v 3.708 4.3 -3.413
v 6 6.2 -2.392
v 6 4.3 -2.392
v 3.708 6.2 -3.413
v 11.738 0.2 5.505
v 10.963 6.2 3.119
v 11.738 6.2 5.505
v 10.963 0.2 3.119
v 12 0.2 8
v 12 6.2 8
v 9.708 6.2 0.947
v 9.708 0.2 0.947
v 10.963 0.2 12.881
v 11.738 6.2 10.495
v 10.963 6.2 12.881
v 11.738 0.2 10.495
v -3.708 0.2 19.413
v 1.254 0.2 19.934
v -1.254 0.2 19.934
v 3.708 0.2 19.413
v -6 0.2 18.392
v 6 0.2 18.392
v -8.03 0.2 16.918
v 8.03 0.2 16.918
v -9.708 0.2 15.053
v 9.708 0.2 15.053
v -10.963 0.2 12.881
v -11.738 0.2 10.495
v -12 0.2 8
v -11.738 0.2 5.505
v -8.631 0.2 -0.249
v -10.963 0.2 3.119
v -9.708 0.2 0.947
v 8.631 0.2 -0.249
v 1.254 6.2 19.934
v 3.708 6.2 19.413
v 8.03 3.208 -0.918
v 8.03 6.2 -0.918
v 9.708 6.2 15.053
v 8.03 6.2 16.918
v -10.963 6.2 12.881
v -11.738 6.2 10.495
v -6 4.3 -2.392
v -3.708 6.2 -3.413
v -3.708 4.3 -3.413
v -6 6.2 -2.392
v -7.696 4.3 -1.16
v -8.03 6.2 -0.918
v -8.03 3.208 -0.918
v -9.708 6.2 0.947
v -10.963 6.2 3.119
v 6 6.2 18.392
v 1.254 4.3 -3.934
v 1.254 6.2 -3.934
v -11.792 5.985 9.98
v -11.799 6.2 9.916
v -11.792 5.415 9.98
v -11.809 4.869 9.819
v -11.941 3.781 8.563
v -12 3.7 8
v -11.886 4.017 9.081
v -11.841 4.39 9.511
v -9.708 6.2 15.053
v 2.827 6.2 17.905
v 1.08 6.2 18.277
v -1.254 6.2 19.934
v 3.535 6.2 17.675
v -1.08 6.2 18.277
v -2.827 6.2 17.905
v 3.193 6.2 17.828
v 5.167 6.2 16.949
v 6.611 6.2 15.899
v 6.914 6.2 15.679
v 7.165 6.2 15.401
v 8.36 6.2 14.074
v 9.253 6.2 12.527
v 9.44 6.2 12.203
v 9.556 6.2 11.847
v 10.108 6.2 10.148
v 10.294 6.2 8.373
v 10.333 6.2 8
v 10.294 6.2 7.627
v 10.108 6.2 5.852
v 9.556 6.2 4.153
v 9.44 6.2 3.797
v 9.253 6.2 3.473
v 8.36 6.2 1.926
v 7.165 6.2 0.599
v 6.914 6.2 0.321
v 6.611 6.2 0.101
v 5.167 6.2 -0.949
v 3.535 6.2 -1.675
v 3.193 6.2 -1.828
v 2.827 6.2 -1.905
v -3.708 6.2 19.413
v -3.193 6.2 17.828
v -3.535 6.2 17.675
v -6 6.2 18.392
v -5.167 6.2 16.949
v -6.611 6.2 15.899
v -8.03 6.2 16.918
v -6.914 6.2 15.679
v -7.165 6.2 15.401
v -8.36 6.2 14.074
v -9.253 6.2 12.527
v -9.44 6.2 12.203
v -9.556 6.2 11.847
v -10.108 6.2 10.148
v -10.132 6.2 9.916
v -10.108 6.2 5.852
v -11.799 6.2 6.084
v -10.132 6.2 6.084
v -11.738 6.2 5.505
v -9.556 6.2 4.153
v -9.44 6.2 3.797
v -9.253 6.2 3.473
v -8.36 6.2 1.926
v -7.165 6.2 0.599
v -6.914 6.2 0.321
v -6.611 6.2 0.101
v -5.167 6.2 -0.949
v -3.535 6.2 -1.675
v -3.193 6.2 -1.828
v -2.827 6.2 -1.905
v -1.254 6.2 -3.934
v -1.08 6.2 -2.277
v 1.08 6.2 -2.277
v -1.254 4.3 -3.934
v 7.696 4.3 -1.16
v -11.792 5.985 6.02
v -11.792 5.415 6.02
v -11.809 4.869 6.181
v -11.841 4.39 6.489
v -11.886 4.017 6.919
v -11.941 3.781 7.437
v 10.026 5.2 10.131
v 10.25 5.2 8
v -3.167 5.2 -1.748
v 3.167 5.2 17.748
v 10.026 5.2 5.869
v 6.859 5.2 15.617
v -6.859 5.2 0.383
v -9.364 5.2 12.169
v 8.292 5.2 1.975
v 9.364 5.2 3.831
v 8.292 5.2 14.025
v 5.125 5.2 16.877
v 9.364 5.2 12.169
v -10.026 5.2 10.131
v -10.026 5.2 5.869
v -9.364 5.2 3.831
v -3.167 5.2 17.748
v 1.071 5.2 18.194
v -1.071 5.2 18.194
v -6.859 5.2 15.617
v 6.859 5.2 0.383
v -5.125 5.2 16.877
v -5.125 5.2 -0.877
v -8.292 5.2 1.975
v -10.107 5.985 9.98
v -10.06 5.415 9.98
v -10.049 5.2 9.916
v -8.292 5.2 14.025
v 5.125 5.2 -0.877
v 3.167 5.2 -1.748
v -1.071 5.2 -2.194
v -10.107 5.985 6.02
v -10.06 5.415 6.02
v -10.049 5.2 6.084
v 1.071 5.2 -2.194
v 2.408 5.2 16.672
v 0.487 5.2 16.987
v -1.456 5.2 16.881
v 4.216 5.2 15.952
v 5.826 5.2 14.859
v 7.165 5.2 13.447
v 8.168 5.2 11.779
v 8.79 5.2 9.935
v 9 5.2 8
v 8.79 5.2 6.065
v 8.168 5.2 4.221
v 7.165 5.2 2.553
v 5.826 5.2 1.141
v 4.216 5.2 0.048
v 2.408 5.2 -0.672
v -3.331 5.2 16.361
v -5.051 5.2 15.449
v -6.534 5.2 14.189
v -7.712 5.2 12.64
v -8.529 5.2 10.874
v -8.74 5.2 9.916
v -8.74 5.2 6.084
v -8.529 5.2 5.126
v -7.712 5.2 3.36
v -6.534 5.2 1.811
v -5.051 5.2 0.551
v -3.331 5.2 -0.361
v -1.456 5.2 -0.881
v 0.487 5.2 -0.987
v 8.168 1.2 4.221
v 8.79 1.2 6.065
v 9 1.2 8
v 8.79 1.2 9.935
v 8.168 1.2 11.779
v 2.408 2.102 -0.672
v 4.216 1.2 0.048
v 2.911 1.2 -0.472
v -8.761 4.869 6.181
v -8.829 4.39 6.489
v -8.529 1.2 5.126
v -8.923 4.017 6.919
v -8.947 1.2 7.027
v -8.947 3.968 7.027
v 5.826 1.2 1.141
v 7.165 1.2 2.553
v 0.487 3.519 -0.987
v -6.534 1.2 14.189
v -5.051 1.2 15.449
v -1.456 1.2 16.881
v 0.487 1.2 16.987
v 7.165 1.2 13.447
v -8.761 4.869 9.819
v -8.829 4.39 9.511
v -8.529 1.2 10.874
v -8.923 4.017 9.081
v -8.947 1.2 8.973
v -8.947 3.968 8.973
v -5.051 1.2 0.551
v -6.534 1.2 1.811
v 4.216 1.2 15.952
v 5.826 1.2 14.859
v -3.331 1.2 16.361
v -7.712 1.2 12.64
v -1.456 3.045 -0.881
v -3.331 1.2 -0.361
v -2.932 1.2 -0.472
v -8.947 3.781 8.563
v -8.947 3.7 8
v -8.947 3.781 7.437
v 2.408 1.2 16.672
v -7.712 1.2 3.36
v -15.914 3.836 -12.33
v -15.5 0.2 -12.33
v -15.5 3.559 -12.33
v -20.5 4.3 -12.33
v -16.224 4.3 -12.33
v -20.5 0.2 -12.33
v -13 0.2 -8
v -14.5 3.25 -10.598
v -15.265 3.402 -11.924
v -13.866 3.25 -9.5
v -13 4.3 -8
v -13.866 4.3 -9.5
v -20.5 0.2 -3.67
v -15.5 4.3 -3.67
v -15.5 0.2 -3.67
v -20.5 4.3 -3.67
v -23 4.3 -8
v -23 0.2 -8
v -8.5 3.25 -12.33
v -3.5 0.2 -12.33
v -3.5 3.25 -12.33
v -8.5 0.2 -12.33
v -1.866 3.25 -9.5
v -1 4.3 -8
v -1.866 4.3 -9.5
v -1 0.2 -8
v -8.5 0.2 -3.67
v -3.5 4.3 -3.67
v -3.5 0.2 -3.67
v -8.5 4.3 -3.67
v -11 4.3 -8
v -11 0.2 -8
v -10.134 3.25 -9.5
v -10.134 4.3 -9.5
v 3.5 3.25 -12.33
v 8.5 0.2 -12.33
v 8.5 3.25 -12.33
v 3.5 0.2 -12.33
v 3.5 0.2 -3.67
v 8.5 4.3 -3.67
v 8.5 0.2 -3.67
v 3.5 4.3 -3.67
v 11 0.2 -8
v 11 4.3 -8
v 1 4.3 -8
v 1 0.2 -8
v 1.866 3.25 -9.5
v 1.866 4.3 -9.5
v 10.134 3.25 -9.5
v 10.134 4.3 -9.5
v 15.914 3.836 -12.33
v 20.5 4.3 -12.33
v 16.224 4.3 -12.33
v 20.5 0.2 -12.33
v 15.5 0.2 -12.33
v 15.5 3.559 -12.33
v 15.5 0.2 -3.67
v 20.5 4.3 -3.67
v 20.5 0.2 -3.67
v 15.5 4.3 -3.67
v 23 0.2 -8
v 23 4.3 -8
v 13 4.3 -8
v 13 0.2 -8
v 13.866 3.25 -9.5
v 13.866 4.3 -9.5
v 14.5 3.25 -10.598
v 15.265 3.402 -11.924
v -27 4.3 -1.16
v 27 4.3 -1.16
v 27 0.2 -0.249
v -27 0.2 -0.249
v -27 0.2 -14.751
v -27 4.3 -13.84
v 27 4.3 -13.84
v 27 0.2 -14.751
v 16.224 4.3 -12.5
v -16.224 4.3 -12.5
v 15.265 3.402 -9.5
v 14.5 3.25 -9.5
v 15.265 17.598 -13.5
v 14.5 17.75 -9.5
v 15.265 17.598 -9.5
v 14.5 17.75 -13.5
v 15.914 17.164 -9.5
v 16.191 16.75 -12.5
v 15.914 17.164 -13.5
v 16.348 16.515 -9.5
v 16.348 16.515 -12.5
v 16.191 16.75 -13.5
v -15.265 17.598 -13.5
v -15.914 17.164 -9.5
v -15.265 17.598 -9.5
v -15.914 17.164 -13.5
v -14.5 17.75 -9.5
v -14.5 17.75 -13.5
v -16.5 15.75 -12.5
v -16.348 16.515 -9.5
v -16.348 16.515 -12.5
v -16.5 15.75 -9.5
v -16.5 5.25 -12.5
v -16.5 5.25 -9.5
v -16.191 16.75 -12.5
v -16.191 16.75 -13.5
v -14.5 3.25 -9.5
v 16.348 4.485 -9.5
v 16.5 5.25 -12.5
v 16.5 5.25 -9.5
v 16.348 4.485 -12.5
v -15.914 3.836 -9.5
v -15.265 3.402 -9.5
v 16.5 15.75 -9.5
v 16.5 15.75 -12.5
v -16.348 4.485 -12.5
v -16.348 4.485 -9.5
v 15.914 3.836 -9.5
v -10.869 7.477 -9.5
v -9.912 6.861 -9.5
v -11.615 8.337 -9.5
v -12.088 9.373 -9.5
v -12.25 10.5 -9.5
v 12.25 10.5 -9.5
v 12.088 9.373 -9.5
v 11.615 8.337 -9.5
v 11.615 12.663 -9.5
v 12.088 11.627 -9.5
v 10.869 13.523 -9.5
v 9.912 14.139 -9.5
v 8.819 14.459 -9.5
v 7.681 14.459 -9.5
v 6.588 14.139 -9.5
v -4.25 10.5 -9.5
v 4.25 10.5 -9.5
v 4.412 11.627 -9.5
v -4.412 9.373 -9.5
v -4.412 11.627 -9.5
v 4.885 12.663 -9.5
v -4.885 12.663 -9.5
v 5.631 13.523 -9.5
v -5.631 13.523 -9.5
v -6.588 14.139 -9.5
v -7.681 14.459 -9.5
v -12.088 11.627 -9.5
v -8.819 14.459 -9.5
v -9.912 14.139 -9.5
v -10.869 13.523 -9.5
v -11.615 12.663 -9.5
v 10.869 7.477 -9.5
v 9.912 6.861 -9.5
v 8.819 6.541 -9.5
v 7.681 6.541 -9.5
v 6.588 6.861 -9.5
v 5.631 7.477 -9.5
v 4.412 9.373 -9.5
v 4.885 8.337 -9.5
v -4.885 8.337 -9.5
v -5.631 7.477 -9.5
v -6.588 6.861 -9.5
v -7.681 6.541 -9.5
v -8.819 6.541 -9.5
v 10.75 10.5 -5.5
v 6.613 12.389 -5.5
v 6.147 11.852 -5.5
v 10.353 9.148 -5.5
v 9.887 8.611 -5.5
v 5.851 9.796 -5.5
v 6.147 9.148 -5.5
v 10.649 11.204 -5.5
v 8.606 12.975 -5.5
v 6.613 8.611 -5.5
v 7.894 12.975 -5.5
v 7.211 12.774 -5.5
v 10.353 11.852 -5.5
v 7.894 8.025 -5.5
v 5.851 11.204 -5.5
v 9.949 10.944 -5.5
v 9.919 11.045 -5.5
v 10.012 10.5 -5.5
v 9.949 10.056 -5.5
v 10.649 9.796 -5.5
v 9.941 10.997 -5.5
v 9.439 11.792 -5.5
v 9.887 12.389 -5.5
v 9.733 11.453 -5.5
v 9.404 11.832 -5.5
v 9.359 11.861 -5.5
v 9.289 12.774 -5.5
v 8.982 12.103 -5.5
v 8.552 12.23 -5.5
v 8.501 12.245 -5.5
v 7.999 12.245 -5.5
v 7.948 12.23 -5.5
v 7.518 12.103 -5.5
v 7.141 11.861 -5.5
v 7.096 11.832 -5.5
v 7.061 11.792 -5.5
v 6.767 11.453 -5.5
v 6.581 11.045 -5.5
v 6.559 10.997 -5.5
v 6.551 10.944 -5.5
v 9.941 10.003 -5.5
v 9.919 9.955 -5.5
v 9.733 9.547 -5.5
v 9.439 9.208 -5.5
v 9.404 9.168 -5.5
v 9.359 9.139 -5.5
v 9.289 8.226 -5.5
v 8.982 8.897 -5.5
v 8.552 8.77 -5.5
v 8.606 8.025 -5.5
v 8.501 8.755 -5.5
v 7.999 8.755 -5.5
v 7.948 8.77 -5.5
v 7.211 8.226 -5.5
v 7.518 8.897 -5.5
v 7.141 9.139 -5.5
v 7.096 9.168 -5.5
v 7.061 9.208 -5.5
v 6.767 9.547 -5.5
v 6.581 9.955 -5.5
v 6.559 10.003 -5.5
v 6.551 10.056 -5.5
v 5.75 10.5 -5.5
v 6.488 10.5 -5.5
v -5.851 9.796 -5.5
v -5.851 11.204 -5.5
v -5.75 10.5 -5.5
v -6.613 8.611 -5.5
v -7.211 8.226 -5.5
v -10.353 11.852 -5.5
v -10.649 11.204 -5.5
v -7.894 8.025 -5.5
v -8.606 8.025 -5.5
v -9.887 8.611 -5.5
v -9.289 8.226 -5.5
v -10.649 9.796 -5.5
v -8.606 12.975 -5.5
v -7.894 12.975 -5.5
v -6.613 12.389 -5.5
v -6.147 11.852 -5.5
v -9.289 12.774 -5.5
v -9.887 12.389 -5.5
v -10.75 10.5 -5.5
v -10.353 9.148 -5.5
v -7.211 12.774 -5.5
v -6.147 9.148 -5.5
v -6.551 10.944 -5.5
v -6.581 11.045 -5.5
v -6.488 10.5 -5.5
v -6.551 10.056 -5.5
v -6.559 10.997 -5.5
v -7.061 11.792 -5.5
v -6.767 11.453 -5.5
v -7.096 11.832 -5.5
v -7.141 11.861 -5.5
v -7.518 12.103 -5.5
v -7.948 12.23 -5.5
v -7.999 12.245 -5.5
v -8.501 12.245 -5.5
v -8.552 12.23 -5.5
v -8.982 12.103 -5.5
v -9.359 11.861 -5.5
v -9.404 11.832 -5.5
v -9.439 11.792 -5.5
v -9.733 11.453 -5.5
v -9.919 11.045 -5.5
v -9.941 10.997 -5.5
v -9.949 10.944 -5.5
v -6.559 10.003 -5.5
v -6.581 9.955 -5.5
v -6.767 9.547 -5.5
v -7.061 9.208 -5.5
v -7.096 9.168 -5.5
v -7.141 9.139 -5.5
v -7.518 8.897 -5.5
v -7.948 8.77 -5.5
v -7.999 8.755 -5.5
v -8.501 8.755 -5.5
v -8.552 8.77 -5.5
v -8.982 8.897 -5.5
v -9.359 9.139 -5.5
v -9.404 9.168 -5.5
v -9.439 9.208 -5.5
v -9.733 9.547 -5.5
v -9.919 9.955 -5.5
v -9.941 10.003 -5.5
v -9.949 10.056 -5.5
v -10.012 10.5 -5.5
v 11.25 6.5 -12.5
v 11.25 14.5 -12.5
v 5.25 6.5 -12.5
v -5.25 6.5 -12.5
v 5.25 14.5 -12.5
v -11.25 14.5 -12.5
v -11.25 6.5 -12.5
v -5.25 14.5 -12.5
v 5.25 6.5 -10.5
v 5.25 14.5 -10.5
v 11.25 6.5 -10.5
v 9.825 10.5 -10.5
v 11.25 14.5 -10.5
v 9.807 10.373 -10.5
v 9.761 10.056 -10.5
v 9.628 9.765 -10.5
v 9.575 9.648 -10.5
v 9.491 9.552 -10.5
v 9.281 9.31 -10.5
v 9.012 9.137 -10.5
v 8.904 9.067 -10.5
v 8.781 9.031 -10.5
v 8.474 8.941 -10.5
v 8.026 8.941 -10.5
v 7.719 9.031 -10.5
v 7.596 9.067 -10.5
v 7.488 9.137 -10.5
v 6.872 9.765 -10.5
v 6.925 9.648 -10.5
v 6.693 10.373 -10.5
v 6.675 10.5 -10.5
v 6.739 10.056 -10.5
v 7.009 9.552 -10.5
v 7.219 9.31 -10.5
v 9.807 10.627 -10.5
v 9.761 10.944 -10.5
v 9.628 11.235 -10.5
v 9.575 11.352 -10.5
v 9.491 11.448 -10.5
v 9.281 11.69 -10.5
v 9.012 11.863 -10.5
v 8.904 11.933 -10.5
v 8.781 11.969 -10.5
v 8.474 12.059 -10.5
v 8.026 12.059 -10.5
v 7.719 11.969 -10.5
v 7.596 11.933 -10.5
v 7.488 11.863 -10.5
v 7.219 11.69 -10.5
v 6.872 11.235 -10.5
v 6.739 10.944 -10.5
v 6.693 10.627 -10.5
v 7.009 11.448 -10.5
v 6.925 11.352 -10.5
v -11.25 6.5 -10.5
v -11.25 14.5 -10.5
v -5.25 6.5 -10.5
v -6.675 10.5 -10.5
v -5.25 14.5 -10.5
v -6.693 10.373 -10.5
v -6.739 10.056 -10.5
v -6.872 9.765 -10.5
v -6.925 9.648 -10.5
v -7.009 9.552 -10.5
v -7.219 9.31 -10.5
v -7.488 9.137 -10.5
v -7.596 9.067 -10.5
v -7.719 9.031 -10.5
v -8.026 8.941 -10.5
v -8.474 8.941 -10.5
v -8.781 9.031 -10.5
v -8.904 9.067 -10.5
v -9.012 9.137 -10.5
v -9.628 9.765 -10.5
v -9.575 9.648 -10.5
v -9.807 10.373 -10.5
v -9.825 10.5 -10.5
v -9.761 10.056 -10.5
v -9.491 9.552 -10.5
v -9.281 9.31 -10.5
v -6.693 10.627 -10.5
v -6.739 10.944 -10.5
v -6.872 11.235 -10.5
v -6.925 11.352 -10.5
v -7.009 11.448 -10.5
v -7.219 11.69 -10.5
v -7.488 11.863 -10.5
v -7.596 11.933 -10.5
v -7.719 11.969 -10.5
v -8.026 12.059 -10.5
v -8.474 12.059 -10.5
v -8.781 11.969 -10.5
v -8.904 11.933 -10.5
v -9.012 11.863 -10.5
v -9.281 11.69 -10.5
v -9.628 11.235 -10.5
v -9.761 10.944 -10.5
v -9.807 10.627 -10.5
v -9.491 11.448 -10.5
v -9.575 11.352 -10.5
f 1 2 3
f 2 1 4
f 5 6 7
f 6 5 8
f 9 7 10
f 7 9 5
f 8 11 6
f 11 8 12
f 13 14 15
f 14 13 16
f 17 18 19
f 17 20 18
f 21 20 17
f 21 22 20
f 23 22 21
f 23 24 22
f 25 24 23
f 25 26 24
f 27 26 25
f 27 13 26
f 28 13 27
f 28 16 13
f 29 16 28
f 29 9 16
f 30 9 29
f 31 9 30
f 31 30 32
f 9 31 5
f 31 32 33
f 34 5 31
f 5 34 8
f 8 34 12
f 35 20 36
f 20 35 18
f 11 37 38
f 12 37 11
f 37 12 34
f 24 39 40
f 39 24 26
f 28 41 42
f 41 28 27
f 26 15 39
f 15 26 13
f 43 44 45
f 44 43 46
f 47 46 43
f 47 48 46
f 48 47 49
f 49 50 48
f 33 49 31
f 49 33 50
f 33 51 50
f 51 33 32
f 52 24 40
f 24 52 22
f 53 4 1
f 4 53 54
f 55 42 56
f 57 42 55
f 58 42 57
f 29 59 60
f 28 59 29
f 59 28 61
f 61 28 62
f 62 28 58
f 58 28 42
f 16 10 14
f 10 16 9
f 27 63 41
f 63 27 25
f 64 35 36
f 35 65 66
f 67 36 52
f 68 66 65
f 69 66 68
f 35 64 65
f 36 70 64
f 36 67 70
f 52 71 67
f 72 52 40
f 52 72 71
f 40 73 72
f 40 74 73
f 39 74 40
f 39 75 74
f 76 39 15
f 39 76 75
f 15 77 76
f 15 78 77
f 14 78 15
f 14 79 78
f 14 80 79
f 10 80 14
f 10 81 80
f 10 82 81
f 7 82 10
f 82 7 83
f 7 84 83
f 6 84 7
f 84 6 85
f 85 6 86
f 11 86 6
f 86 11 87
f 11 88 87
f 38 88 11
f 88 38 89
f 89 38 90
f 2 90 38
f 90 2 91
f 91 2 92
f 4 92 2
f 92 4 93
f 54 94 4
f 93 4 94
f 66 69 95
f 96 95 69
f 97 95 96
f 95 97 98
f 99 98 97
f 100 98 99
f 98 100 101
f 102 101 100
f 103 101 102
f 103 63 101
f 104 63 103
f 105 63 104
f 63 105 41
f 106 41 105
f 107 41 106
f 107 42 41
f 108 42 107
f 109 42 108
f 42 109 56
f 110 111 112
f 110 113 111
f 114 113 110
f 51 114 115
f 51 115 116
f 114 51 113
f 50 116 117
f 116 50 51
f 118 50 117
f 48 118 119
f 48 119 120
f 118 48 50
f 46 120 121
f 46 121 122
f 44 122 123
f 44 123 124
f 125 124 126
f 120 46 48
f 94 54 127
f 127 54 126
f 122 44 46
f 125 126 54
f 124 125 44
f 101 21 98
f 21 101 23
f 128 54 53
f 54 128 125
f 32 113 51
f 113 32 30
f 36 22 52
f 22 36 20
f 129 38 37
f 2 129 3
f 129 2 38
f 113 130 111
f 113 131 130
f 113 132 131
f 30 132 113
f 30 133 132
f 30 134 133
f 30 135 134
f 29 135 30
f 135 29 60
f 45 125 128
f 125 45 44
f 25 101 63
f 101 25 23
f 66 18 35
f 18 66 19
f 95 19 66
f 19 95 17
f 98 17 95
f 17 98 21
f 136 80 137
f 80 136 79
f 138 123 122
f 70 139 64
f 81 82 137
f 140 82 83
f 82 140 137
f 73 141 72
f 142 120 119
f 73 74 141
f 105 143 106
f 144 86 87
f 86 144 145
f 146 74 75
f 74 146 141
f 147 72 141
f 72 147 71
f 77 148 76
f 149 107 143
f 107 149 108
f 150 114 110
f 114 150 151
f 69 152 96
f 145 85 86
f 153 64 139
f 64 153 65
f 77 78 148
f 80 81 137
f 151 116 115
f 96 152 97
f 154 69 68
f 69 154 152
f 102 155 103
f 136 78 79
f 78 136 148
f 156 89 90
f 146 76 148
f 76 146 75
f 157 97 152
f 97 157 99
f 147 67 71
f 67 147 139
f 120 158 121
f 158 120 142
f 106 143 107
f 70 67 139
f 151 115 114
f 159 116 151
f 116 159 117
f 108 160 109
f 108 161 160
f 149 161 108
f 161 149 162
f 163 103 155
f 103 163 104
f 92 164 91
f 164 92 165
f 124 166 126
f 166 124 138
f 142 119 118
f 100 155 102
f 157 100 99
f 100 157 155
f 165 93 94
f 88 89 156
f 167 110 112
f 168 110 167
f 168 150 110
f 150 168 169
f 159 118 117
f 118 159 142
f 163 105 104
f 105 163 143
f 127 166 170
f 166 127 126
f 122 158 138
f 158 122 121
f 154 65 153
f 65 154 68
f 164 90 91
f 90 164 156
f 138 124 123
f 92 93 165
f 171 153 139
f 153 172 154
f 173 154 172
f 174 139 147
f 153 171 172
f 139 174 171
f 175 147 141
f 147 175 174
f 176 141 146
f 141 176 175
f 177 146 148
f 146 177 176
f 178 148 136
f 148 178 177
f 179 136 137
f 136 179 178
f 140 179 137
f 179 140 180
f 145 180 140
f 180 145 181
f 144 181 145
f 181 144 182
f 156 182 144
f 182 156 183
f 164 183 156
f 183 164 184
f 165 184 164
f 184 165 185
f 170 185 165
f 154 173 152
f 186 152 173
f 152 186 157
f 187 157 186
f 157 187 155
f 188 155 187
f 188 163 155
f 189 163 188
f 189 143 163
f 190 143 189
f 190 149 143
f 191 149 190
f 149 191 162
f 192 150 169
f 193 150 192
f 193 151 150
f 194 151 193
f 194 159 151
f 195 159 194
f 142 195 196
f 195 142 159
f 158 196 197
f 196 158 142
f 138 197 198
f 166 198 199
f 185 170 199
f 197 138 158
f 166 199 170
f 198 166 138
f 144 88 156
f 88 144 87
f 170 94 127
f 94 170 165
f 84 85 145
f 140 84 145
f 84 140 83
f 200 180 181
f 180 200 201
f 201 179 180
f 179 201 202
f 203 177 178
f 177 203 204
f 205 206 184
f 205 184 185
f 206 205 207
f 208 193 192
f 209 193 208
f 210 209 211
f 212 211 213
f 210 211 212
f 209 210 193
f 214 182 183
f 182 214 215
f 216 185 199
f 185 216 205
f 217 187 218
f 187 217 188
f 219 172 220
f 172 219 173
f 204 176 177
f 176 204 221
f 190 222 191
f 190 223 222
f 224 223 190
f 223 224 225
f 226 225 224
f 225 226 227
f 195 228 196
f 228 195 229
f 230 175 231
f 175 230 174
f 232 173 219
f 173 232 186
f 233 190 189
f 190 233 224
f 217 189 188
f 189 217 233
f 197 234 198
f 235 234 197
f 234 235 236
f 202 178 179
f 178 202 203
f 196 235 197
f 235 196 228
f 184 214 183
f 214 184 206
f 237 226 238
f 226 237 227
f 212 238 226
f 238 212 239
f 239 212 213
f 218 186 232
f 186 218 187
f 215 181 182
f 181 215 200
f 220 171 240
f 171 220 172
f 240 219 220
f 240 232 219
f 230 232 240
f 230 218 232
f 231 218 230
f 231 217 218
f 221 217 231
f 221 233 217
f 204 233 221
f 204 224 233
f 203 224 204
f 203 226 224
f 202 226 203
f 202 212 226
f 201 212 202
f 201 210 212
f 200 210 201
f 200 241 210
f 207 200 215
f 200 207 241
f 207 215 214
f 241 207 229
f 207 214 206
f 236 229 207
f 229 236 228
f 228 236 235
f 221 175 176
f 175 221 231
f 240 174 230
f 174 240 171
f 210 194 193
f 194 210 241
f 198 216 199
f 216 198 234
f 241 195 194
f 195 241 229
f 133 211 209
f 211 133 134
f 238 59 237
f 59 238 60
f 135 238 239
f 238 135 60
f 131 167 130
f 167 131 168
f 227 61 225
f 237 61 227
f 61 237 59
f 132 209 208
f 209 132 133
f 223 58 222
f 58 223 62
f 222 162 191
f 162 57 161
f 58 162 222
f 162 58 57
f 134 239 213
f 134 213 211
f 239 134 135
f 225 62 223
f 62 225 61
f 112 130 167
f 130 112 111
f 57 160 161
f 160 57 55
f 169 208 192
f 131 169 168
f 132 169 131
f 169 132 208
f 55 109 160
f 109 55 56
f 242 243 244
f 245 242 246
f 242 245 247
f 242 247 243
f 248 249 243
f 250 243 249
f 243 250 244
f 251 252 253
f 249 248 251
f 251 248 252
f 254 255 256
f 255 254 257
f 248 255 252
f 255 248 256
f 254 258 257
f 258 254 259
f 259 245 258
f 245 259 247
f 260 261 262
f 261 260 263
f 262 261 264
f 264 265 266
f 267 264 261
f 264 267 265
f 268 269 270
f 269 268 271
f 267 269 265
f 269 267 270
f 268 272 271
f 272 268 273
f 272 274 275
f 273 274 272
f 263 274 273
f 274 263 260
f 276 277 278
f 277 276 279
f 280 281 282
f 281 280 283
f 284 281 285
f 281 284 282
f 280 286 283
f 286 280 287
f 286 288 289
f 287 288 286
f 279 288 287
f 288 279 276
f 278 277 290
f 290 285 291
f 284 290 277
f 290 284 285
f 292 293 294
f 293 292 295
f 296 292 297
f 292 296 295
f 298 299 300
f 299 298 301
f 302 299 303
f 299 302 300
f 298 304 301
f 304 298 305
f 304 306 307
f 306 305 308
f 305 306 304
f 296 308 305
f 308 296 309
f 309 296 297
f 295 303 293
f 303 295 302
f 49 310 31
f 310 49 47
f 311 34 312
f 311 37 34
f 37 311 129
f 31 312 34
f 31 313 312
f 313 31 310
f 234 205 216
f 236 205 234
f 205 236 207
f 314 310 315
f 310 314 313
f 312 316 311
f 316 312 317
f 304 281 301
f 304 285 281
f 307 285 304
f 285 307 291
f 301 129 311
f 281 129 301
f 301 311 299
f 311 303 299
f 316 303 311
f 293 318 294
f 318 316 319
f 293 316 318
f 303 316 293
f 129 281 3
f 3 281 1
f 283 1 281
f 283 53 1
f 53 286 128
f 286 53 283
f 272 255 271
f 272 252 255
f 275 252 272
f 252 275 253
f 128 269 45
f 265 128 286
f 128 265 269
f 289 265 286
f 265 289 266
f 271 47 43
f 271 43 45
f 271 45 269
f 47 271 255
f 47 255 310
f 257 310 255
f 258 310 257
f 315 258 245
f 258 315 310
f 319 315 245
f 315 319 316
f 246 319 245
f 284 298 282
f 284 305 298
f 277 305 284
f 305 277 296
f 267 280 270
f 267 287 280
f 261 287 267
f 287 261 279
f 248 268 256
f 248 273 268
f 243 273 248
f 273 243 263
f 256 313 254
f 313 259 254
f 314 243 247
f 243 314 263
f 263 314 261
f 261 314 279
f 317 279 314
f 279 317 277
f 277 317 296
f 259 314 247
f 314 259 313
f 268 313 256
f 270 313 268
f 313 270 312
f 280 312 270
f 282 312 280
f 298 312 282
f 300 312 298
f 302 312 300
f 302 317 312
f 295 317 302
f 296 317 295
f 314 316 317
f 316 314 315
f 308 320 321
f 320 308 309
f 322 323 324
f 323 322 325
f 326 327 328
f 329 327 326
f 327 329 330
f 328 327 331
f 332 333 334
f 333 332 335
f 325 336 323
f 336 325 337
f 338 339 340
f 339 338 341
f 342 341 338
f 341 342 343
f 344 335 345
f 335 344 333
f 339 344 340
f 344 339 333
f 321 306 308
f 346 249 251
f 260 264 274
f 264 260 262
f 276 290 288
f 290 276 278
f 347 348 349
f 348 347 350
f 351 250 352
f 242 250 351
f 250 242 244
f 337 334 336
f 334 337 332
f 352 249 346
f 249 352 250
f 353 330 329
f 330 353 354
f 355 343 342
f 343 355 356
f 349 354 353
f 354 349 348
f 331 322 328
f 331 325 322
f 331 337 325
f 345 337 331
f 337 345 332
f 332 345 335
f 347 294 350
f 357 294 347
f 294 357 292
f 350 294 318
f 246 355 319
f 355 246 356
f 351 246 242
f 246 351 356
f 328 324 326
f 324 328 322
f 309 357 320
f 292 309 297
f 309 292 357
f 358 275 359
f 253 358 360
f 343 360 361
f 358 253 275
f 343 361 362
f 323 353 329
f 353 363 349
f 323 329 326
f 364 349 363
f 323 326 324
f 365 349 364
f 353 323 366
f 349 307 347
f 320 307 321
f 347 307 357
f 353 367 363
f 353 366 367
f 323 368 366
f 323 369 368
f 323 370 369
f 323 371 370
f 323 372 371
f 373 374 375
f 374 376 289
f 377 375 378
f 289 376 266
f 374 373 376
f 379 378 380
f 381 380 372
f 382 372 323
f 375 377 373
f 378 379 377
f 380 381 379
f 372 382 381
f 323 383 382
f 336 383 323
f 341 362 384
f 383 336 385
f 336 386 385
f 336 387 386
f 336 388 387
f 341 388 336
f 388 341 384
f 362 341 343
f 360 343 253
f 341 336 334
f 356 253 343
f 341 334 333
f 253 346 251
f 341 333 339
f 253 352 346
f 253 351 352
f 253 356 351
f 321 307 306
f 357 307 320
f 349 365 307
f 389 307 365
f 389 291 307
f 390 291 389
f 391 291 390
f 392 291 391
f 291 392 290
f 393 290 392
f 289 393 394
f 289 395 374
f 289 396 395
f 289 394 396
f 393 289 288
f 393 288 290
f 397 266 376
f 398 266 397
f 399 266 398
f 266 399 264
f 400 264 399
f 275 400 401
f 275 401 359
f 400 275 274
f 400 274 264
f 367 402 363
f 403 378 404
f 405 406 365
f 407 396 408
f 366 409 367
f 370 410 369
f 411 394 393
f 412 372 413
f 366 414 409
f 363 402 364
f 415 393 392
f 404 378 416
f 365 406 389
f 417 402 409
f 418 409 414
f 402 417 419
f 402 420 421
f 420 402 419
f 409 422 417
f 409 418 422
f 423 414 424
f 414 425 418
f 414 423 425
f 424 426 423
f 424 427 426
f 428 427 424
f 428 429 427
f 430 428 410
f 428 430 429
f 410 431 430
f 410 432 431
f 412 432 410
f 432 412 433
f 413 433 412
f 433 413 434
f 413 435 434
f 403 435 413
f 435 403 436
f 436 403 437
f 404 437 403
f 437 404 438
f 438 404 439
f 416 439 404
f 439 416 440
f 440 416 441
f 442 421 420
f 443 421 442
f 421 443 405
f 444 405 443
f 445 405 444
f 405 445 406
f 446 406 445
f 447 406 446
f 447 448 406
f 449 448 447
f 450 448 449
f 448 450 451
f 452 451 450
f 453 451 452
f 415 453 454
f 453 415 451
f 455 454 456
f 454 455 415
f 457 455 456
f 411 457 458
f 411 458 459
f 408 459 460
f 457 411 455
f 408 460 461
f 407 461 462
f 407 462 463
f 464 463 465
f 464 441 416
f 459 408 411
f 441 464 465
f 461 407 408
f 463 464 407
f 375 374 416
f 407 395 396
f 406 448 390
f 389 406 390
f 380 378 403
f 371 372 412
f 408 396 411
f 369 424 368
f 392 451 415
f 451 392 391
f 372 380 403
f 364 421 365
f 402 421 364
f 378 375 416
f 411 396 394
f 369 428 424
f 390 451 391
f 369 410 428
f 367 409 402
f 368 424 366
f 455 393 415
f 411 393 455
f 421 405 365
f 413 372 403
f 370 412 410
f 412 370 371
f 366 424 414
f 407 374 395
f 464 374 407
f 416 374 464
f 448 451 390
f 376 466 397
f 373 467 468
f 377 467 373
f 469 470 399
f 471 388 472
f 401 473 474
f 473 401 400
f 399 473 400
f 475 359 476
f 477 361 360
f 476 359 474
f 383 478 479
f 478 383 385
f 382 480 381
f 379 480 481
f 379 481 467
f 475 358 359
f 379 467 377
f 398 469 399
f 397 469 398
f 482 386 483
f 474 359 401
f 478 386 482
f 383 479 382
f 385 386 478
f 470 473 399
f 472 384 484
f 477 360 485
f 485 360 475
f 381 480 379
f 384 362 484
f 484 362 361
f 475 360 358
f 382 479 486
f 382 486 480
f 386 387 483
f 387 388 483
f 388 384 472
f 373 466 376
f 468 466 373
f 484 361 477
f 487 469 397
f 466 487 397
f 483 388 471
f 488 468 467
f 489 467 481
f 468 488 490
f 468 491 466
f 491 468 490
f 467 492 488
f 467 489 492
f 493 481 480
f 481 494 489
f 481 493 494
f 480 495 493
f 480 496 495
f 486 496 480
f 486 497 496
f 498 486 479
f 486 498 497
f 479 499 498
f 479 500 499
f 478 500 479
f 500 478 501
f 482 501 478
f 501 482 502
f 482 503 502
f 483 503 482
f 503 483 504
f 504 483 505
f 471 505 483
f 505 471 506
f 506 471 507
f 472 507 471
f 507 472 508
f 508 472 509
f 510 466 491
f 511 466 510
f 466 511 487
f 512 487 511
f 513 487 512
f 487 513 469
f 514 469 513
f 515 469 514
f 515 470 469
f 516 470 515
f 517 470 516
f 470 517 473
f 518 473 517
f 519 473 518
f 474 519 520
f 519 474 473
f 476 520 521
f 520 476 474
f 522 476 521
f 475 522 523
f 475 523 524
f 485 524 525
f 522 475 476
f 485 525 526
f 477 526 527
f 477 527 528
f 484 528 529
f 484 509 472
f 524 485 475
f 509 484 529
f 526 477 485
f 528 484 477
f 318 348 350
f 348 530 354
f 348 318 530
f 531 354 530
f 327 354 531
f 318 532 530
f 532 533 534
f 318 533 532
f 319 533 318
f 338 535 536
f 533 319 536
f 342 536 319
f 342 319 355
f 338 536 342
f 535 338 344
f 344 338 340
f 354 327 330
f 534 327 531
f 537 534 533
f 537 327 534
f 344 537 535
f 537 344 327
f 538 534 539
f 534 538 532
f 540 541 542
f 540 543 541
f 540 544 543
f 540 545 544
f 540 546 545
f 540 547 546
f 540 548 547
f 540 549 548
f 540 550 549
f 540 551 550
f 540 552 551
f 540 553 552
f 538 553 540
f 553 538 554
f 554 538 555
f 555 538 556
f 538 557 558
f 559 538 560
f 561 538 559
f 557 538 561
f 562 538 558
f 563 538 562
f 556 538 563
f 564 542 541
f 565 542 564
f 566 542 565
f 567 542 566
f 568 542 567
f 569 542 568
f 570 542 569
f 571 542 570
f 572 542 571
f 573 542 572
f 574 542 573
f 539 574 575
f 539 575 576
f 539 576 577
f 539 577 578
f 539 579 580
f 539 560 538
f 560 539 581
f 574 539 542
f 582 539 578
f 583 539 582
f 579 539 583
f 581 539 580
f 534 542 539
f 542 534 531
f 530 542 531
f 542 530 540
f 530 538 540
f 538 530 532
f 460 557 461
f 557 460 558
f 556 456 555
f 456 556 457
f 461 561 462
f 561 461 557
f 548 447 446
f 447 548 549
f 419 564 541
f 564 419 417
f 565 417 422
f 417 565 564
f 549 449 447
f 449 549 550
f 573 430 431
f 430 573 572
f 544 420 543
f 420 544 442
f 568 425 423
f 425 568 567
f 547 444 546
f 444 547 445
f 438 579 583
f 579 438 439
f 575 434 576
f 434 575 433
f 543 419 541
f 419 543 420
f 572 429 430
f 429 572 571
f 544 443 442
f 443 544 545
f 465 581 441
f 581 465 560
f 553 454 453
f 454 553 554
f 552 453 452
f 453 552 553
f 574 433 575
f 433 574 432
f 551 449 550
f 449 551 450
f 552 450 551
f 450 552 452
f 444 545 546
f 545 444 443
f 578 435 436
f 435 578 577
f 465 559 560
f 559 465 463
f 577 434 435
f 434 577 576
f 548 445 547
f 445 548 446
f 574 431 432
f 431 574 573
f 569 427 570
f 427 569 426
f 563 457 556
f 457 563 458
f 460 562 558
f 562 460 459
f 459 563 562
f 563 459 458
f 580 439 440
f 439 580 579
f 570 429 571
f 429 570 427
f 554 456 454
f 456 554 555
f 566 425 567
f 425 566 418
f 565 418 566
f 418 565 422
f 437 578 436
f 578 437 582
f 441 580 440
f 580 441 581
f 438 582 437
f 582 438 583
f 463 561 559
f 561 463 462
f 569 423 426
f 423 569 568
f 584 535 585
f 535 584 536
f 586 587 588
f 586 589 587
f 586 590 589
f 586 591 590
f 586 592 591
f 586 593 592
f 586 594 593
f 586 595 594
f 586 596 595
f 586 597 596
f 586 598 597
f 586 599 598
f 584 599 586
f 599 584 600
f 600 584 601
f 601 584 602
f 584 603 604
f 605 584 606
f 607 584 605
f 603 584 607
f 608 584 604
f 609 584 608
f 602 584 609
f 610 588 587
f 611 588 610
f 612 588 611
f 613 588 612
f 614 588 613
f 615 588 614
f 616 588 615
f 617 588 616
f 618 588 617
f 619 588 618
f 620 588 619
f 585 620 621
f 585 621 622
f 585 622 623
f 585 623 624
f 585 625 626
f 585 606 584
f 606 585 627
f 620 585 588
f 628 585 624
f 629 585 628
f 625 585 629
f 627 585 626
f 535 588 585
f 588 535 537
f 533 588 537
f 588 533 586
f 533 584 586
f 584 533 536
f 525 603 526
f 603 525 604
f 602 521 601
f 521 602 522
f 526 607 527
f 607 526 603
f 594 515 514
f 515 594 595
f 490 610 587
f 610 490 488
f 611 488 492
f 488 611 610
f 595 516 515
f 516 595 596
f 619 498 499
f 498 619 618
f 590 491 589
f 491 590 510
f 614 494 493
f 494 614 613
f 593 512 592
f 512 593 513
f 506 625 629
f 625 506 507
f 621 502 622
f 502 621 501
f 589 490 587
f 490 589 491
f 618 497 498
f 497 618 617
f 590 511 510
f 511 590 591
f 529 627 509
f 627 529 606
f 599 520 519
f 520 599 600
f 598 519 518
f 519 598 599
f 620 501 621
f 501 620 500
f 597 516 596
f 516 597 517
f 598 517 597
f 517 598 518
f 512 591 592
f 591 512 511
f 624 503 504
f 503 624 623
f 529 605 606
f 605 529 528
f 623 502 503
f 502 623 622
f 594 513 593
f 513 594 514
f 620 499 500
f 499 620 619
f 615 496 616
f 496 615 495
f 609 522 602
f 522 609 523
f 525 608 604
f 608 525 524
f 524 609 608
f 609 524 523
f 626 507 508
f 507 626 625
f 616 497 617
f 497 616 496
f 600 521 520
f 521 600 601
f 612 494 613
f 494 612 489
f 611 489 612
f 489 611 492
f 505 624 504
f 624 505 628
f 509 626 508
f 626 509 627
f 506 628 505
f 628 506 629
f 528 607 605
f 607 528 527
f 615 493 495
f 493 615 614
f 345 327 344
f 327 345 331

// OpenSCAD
// BB-3c
// This is the mount for LED strip

tol=0.25;
extra=4;
/*
//-----------------------
// Piezo
translate([0,3,0]) rotate([-90,-90,0])
color("orange"){
    union(){
        cylinder(r=10,h=0.2);
        cylinder(r=8,h=1);
        translate([0,-7,0.5])
        rotate([90,0,0]) cylinder(r=0.5,h=8);
        translate([1,-7,0.5])
        rotate([90,0,0]) cylinder(r=0.5,h=8);
    }
}
*/
/*
//-----------------------------------
// Horn
translate([0,7,8]) rotate([-90,0,0])

union(){
H=8; // height total
K=4;    // how fast to neck down
J=0.5;  // eccentricity
L=45;    // rotation
Y=0;    // y-axis offset

for(i=[0:99]){
    translate([0,Y*i/100,H*i/100])
    rotate([L*i/100,0,0])
         scale([1-J*i/100,1,1]){
     difference(){
         cylinder(r=12-K*i/100,h=0.4);
         cylinder(r=10-K*i/100,h=0.8,center=true);
     }
 }
 }

translate([0,-30,8])
rotate([90,0,180])

color("pink"){
H2=30; // height total
K2=4;    // how fast to neck down
J2=.5;  // eccentricity
J3=.5;  // eccentricity
L2=45;    // rotation
Y2=0;    // y-axis offset

for(i=[0:99]){
    translate([0,Y2*i/100,H2*i/100])
    rotate([L2*i/100,0,0])
         scale([1-J2*i/100+J3*(99-i)/100,1-J3*(99-i)/100,1]){
     difference(){
         cylinder(r=12-K2*i/100,h=0.4);
         cylinder(r=10-K2*i/100,h=1,center=true);
     }
 }
 }
}




// attachment to base
    translate([0,0,-3])
    difference(){
        cylinder(r=14,h=3.5);
        cylinder(r1=12,r2=9,h=3.6);
        cylinder(r1=12,r2=12,h=2.0);
    }
    
    
}   // end of union

// Number tag
    translate([0,19.0+3,28]) rotate([90,0,0]){
        difference(){
        cylinder(r=8,h=1);
    
    translate ([-0.5,-0.5,0.5]) color("red") rotate([0,180,0])
    linear_extrude(height=1.0){
    text("7", font = "Open Sans:style=Bold", size=8,halign="center",valign="center",spacing=1.1);
    }
}
}
*/

//-------------------------------------
// backshell
translate([0,0.2,8]) rotate([-90,0,0])
color("green"){
    difference(){
        cylinder(r=12,h=6);
        translate([0,0,5]) cylinder(r1=10.25,r2=10.75,h=6);
        translate([0,0,1]) cylinder(r=9,h=6);
        translate([-18,0,5.5]) rotate([0,90,0]) cylinder(r=2,h=10,$fn=22);
    }
}

//-------------------------------
// Crossbar

    difference(){
    // Cutouts in the bottom outer rail to support fiber crossbar
        ps1=[ [0,0], [15,0], [14,4.5], [1,4.5] ];
        translate([-27,0,0]) rotate([0,90,0])
        linear_extrude(height=54) offset(r=-0.2) polygon(points=ps1);
i=0;
N=4;
    for(i=[0:1:N-1])
        translate([-18+12*i,0,-8]) 
        rotate([90,0,0]) cylinder(r=5,h=10,center=true,$fn=6);
}

//----------------
// LED support
translate([0,10.5,-13.5]) //rotate([-90,0,0])
difference(){
    union(){
        // Main bar
        linear_extrude(height=2,scale=1) 
        offset(r=2,$fn=16) offset(r=-2,$fn=16)
        square(size=[33,14.5],center=true);

        translate([0,0,2])    
        linear_extrude(height=2,scale=1) 
        offset(r=2,$fn=16) offset(r=-2,$fn=16)
        square(size=[33,14.5],center=true);
        
    translate([16.5/2,0,4]) cylinder(r1=4,r2=2.5,h=4,$fn=22);
    translate([-16.5/2,0,4]) cylinder(r1=4,r2=2.5,h=4,$fn=22);
    
    }
    
    // Channel for tape
    translate([0,0,0])
    linear_extrude(height=1) square(size=[54,12.5],center=true);
    
    // Cutouts for LED bodies and fibers
    translate([16.5/2,0,1]){
        linear_extrude(height=2) square(size=[6,8],center=true);
        cylinder(r1=1.5,r2=1.8,h=8,$fn=22);
    }

    translate([-16.5/2,0,1]){
        linear_extrude(height=2) square(size=[6,8],center=true);
        cylinder(r1=1.5,r2=1.8,h=8,$fn=22);
    }

}
